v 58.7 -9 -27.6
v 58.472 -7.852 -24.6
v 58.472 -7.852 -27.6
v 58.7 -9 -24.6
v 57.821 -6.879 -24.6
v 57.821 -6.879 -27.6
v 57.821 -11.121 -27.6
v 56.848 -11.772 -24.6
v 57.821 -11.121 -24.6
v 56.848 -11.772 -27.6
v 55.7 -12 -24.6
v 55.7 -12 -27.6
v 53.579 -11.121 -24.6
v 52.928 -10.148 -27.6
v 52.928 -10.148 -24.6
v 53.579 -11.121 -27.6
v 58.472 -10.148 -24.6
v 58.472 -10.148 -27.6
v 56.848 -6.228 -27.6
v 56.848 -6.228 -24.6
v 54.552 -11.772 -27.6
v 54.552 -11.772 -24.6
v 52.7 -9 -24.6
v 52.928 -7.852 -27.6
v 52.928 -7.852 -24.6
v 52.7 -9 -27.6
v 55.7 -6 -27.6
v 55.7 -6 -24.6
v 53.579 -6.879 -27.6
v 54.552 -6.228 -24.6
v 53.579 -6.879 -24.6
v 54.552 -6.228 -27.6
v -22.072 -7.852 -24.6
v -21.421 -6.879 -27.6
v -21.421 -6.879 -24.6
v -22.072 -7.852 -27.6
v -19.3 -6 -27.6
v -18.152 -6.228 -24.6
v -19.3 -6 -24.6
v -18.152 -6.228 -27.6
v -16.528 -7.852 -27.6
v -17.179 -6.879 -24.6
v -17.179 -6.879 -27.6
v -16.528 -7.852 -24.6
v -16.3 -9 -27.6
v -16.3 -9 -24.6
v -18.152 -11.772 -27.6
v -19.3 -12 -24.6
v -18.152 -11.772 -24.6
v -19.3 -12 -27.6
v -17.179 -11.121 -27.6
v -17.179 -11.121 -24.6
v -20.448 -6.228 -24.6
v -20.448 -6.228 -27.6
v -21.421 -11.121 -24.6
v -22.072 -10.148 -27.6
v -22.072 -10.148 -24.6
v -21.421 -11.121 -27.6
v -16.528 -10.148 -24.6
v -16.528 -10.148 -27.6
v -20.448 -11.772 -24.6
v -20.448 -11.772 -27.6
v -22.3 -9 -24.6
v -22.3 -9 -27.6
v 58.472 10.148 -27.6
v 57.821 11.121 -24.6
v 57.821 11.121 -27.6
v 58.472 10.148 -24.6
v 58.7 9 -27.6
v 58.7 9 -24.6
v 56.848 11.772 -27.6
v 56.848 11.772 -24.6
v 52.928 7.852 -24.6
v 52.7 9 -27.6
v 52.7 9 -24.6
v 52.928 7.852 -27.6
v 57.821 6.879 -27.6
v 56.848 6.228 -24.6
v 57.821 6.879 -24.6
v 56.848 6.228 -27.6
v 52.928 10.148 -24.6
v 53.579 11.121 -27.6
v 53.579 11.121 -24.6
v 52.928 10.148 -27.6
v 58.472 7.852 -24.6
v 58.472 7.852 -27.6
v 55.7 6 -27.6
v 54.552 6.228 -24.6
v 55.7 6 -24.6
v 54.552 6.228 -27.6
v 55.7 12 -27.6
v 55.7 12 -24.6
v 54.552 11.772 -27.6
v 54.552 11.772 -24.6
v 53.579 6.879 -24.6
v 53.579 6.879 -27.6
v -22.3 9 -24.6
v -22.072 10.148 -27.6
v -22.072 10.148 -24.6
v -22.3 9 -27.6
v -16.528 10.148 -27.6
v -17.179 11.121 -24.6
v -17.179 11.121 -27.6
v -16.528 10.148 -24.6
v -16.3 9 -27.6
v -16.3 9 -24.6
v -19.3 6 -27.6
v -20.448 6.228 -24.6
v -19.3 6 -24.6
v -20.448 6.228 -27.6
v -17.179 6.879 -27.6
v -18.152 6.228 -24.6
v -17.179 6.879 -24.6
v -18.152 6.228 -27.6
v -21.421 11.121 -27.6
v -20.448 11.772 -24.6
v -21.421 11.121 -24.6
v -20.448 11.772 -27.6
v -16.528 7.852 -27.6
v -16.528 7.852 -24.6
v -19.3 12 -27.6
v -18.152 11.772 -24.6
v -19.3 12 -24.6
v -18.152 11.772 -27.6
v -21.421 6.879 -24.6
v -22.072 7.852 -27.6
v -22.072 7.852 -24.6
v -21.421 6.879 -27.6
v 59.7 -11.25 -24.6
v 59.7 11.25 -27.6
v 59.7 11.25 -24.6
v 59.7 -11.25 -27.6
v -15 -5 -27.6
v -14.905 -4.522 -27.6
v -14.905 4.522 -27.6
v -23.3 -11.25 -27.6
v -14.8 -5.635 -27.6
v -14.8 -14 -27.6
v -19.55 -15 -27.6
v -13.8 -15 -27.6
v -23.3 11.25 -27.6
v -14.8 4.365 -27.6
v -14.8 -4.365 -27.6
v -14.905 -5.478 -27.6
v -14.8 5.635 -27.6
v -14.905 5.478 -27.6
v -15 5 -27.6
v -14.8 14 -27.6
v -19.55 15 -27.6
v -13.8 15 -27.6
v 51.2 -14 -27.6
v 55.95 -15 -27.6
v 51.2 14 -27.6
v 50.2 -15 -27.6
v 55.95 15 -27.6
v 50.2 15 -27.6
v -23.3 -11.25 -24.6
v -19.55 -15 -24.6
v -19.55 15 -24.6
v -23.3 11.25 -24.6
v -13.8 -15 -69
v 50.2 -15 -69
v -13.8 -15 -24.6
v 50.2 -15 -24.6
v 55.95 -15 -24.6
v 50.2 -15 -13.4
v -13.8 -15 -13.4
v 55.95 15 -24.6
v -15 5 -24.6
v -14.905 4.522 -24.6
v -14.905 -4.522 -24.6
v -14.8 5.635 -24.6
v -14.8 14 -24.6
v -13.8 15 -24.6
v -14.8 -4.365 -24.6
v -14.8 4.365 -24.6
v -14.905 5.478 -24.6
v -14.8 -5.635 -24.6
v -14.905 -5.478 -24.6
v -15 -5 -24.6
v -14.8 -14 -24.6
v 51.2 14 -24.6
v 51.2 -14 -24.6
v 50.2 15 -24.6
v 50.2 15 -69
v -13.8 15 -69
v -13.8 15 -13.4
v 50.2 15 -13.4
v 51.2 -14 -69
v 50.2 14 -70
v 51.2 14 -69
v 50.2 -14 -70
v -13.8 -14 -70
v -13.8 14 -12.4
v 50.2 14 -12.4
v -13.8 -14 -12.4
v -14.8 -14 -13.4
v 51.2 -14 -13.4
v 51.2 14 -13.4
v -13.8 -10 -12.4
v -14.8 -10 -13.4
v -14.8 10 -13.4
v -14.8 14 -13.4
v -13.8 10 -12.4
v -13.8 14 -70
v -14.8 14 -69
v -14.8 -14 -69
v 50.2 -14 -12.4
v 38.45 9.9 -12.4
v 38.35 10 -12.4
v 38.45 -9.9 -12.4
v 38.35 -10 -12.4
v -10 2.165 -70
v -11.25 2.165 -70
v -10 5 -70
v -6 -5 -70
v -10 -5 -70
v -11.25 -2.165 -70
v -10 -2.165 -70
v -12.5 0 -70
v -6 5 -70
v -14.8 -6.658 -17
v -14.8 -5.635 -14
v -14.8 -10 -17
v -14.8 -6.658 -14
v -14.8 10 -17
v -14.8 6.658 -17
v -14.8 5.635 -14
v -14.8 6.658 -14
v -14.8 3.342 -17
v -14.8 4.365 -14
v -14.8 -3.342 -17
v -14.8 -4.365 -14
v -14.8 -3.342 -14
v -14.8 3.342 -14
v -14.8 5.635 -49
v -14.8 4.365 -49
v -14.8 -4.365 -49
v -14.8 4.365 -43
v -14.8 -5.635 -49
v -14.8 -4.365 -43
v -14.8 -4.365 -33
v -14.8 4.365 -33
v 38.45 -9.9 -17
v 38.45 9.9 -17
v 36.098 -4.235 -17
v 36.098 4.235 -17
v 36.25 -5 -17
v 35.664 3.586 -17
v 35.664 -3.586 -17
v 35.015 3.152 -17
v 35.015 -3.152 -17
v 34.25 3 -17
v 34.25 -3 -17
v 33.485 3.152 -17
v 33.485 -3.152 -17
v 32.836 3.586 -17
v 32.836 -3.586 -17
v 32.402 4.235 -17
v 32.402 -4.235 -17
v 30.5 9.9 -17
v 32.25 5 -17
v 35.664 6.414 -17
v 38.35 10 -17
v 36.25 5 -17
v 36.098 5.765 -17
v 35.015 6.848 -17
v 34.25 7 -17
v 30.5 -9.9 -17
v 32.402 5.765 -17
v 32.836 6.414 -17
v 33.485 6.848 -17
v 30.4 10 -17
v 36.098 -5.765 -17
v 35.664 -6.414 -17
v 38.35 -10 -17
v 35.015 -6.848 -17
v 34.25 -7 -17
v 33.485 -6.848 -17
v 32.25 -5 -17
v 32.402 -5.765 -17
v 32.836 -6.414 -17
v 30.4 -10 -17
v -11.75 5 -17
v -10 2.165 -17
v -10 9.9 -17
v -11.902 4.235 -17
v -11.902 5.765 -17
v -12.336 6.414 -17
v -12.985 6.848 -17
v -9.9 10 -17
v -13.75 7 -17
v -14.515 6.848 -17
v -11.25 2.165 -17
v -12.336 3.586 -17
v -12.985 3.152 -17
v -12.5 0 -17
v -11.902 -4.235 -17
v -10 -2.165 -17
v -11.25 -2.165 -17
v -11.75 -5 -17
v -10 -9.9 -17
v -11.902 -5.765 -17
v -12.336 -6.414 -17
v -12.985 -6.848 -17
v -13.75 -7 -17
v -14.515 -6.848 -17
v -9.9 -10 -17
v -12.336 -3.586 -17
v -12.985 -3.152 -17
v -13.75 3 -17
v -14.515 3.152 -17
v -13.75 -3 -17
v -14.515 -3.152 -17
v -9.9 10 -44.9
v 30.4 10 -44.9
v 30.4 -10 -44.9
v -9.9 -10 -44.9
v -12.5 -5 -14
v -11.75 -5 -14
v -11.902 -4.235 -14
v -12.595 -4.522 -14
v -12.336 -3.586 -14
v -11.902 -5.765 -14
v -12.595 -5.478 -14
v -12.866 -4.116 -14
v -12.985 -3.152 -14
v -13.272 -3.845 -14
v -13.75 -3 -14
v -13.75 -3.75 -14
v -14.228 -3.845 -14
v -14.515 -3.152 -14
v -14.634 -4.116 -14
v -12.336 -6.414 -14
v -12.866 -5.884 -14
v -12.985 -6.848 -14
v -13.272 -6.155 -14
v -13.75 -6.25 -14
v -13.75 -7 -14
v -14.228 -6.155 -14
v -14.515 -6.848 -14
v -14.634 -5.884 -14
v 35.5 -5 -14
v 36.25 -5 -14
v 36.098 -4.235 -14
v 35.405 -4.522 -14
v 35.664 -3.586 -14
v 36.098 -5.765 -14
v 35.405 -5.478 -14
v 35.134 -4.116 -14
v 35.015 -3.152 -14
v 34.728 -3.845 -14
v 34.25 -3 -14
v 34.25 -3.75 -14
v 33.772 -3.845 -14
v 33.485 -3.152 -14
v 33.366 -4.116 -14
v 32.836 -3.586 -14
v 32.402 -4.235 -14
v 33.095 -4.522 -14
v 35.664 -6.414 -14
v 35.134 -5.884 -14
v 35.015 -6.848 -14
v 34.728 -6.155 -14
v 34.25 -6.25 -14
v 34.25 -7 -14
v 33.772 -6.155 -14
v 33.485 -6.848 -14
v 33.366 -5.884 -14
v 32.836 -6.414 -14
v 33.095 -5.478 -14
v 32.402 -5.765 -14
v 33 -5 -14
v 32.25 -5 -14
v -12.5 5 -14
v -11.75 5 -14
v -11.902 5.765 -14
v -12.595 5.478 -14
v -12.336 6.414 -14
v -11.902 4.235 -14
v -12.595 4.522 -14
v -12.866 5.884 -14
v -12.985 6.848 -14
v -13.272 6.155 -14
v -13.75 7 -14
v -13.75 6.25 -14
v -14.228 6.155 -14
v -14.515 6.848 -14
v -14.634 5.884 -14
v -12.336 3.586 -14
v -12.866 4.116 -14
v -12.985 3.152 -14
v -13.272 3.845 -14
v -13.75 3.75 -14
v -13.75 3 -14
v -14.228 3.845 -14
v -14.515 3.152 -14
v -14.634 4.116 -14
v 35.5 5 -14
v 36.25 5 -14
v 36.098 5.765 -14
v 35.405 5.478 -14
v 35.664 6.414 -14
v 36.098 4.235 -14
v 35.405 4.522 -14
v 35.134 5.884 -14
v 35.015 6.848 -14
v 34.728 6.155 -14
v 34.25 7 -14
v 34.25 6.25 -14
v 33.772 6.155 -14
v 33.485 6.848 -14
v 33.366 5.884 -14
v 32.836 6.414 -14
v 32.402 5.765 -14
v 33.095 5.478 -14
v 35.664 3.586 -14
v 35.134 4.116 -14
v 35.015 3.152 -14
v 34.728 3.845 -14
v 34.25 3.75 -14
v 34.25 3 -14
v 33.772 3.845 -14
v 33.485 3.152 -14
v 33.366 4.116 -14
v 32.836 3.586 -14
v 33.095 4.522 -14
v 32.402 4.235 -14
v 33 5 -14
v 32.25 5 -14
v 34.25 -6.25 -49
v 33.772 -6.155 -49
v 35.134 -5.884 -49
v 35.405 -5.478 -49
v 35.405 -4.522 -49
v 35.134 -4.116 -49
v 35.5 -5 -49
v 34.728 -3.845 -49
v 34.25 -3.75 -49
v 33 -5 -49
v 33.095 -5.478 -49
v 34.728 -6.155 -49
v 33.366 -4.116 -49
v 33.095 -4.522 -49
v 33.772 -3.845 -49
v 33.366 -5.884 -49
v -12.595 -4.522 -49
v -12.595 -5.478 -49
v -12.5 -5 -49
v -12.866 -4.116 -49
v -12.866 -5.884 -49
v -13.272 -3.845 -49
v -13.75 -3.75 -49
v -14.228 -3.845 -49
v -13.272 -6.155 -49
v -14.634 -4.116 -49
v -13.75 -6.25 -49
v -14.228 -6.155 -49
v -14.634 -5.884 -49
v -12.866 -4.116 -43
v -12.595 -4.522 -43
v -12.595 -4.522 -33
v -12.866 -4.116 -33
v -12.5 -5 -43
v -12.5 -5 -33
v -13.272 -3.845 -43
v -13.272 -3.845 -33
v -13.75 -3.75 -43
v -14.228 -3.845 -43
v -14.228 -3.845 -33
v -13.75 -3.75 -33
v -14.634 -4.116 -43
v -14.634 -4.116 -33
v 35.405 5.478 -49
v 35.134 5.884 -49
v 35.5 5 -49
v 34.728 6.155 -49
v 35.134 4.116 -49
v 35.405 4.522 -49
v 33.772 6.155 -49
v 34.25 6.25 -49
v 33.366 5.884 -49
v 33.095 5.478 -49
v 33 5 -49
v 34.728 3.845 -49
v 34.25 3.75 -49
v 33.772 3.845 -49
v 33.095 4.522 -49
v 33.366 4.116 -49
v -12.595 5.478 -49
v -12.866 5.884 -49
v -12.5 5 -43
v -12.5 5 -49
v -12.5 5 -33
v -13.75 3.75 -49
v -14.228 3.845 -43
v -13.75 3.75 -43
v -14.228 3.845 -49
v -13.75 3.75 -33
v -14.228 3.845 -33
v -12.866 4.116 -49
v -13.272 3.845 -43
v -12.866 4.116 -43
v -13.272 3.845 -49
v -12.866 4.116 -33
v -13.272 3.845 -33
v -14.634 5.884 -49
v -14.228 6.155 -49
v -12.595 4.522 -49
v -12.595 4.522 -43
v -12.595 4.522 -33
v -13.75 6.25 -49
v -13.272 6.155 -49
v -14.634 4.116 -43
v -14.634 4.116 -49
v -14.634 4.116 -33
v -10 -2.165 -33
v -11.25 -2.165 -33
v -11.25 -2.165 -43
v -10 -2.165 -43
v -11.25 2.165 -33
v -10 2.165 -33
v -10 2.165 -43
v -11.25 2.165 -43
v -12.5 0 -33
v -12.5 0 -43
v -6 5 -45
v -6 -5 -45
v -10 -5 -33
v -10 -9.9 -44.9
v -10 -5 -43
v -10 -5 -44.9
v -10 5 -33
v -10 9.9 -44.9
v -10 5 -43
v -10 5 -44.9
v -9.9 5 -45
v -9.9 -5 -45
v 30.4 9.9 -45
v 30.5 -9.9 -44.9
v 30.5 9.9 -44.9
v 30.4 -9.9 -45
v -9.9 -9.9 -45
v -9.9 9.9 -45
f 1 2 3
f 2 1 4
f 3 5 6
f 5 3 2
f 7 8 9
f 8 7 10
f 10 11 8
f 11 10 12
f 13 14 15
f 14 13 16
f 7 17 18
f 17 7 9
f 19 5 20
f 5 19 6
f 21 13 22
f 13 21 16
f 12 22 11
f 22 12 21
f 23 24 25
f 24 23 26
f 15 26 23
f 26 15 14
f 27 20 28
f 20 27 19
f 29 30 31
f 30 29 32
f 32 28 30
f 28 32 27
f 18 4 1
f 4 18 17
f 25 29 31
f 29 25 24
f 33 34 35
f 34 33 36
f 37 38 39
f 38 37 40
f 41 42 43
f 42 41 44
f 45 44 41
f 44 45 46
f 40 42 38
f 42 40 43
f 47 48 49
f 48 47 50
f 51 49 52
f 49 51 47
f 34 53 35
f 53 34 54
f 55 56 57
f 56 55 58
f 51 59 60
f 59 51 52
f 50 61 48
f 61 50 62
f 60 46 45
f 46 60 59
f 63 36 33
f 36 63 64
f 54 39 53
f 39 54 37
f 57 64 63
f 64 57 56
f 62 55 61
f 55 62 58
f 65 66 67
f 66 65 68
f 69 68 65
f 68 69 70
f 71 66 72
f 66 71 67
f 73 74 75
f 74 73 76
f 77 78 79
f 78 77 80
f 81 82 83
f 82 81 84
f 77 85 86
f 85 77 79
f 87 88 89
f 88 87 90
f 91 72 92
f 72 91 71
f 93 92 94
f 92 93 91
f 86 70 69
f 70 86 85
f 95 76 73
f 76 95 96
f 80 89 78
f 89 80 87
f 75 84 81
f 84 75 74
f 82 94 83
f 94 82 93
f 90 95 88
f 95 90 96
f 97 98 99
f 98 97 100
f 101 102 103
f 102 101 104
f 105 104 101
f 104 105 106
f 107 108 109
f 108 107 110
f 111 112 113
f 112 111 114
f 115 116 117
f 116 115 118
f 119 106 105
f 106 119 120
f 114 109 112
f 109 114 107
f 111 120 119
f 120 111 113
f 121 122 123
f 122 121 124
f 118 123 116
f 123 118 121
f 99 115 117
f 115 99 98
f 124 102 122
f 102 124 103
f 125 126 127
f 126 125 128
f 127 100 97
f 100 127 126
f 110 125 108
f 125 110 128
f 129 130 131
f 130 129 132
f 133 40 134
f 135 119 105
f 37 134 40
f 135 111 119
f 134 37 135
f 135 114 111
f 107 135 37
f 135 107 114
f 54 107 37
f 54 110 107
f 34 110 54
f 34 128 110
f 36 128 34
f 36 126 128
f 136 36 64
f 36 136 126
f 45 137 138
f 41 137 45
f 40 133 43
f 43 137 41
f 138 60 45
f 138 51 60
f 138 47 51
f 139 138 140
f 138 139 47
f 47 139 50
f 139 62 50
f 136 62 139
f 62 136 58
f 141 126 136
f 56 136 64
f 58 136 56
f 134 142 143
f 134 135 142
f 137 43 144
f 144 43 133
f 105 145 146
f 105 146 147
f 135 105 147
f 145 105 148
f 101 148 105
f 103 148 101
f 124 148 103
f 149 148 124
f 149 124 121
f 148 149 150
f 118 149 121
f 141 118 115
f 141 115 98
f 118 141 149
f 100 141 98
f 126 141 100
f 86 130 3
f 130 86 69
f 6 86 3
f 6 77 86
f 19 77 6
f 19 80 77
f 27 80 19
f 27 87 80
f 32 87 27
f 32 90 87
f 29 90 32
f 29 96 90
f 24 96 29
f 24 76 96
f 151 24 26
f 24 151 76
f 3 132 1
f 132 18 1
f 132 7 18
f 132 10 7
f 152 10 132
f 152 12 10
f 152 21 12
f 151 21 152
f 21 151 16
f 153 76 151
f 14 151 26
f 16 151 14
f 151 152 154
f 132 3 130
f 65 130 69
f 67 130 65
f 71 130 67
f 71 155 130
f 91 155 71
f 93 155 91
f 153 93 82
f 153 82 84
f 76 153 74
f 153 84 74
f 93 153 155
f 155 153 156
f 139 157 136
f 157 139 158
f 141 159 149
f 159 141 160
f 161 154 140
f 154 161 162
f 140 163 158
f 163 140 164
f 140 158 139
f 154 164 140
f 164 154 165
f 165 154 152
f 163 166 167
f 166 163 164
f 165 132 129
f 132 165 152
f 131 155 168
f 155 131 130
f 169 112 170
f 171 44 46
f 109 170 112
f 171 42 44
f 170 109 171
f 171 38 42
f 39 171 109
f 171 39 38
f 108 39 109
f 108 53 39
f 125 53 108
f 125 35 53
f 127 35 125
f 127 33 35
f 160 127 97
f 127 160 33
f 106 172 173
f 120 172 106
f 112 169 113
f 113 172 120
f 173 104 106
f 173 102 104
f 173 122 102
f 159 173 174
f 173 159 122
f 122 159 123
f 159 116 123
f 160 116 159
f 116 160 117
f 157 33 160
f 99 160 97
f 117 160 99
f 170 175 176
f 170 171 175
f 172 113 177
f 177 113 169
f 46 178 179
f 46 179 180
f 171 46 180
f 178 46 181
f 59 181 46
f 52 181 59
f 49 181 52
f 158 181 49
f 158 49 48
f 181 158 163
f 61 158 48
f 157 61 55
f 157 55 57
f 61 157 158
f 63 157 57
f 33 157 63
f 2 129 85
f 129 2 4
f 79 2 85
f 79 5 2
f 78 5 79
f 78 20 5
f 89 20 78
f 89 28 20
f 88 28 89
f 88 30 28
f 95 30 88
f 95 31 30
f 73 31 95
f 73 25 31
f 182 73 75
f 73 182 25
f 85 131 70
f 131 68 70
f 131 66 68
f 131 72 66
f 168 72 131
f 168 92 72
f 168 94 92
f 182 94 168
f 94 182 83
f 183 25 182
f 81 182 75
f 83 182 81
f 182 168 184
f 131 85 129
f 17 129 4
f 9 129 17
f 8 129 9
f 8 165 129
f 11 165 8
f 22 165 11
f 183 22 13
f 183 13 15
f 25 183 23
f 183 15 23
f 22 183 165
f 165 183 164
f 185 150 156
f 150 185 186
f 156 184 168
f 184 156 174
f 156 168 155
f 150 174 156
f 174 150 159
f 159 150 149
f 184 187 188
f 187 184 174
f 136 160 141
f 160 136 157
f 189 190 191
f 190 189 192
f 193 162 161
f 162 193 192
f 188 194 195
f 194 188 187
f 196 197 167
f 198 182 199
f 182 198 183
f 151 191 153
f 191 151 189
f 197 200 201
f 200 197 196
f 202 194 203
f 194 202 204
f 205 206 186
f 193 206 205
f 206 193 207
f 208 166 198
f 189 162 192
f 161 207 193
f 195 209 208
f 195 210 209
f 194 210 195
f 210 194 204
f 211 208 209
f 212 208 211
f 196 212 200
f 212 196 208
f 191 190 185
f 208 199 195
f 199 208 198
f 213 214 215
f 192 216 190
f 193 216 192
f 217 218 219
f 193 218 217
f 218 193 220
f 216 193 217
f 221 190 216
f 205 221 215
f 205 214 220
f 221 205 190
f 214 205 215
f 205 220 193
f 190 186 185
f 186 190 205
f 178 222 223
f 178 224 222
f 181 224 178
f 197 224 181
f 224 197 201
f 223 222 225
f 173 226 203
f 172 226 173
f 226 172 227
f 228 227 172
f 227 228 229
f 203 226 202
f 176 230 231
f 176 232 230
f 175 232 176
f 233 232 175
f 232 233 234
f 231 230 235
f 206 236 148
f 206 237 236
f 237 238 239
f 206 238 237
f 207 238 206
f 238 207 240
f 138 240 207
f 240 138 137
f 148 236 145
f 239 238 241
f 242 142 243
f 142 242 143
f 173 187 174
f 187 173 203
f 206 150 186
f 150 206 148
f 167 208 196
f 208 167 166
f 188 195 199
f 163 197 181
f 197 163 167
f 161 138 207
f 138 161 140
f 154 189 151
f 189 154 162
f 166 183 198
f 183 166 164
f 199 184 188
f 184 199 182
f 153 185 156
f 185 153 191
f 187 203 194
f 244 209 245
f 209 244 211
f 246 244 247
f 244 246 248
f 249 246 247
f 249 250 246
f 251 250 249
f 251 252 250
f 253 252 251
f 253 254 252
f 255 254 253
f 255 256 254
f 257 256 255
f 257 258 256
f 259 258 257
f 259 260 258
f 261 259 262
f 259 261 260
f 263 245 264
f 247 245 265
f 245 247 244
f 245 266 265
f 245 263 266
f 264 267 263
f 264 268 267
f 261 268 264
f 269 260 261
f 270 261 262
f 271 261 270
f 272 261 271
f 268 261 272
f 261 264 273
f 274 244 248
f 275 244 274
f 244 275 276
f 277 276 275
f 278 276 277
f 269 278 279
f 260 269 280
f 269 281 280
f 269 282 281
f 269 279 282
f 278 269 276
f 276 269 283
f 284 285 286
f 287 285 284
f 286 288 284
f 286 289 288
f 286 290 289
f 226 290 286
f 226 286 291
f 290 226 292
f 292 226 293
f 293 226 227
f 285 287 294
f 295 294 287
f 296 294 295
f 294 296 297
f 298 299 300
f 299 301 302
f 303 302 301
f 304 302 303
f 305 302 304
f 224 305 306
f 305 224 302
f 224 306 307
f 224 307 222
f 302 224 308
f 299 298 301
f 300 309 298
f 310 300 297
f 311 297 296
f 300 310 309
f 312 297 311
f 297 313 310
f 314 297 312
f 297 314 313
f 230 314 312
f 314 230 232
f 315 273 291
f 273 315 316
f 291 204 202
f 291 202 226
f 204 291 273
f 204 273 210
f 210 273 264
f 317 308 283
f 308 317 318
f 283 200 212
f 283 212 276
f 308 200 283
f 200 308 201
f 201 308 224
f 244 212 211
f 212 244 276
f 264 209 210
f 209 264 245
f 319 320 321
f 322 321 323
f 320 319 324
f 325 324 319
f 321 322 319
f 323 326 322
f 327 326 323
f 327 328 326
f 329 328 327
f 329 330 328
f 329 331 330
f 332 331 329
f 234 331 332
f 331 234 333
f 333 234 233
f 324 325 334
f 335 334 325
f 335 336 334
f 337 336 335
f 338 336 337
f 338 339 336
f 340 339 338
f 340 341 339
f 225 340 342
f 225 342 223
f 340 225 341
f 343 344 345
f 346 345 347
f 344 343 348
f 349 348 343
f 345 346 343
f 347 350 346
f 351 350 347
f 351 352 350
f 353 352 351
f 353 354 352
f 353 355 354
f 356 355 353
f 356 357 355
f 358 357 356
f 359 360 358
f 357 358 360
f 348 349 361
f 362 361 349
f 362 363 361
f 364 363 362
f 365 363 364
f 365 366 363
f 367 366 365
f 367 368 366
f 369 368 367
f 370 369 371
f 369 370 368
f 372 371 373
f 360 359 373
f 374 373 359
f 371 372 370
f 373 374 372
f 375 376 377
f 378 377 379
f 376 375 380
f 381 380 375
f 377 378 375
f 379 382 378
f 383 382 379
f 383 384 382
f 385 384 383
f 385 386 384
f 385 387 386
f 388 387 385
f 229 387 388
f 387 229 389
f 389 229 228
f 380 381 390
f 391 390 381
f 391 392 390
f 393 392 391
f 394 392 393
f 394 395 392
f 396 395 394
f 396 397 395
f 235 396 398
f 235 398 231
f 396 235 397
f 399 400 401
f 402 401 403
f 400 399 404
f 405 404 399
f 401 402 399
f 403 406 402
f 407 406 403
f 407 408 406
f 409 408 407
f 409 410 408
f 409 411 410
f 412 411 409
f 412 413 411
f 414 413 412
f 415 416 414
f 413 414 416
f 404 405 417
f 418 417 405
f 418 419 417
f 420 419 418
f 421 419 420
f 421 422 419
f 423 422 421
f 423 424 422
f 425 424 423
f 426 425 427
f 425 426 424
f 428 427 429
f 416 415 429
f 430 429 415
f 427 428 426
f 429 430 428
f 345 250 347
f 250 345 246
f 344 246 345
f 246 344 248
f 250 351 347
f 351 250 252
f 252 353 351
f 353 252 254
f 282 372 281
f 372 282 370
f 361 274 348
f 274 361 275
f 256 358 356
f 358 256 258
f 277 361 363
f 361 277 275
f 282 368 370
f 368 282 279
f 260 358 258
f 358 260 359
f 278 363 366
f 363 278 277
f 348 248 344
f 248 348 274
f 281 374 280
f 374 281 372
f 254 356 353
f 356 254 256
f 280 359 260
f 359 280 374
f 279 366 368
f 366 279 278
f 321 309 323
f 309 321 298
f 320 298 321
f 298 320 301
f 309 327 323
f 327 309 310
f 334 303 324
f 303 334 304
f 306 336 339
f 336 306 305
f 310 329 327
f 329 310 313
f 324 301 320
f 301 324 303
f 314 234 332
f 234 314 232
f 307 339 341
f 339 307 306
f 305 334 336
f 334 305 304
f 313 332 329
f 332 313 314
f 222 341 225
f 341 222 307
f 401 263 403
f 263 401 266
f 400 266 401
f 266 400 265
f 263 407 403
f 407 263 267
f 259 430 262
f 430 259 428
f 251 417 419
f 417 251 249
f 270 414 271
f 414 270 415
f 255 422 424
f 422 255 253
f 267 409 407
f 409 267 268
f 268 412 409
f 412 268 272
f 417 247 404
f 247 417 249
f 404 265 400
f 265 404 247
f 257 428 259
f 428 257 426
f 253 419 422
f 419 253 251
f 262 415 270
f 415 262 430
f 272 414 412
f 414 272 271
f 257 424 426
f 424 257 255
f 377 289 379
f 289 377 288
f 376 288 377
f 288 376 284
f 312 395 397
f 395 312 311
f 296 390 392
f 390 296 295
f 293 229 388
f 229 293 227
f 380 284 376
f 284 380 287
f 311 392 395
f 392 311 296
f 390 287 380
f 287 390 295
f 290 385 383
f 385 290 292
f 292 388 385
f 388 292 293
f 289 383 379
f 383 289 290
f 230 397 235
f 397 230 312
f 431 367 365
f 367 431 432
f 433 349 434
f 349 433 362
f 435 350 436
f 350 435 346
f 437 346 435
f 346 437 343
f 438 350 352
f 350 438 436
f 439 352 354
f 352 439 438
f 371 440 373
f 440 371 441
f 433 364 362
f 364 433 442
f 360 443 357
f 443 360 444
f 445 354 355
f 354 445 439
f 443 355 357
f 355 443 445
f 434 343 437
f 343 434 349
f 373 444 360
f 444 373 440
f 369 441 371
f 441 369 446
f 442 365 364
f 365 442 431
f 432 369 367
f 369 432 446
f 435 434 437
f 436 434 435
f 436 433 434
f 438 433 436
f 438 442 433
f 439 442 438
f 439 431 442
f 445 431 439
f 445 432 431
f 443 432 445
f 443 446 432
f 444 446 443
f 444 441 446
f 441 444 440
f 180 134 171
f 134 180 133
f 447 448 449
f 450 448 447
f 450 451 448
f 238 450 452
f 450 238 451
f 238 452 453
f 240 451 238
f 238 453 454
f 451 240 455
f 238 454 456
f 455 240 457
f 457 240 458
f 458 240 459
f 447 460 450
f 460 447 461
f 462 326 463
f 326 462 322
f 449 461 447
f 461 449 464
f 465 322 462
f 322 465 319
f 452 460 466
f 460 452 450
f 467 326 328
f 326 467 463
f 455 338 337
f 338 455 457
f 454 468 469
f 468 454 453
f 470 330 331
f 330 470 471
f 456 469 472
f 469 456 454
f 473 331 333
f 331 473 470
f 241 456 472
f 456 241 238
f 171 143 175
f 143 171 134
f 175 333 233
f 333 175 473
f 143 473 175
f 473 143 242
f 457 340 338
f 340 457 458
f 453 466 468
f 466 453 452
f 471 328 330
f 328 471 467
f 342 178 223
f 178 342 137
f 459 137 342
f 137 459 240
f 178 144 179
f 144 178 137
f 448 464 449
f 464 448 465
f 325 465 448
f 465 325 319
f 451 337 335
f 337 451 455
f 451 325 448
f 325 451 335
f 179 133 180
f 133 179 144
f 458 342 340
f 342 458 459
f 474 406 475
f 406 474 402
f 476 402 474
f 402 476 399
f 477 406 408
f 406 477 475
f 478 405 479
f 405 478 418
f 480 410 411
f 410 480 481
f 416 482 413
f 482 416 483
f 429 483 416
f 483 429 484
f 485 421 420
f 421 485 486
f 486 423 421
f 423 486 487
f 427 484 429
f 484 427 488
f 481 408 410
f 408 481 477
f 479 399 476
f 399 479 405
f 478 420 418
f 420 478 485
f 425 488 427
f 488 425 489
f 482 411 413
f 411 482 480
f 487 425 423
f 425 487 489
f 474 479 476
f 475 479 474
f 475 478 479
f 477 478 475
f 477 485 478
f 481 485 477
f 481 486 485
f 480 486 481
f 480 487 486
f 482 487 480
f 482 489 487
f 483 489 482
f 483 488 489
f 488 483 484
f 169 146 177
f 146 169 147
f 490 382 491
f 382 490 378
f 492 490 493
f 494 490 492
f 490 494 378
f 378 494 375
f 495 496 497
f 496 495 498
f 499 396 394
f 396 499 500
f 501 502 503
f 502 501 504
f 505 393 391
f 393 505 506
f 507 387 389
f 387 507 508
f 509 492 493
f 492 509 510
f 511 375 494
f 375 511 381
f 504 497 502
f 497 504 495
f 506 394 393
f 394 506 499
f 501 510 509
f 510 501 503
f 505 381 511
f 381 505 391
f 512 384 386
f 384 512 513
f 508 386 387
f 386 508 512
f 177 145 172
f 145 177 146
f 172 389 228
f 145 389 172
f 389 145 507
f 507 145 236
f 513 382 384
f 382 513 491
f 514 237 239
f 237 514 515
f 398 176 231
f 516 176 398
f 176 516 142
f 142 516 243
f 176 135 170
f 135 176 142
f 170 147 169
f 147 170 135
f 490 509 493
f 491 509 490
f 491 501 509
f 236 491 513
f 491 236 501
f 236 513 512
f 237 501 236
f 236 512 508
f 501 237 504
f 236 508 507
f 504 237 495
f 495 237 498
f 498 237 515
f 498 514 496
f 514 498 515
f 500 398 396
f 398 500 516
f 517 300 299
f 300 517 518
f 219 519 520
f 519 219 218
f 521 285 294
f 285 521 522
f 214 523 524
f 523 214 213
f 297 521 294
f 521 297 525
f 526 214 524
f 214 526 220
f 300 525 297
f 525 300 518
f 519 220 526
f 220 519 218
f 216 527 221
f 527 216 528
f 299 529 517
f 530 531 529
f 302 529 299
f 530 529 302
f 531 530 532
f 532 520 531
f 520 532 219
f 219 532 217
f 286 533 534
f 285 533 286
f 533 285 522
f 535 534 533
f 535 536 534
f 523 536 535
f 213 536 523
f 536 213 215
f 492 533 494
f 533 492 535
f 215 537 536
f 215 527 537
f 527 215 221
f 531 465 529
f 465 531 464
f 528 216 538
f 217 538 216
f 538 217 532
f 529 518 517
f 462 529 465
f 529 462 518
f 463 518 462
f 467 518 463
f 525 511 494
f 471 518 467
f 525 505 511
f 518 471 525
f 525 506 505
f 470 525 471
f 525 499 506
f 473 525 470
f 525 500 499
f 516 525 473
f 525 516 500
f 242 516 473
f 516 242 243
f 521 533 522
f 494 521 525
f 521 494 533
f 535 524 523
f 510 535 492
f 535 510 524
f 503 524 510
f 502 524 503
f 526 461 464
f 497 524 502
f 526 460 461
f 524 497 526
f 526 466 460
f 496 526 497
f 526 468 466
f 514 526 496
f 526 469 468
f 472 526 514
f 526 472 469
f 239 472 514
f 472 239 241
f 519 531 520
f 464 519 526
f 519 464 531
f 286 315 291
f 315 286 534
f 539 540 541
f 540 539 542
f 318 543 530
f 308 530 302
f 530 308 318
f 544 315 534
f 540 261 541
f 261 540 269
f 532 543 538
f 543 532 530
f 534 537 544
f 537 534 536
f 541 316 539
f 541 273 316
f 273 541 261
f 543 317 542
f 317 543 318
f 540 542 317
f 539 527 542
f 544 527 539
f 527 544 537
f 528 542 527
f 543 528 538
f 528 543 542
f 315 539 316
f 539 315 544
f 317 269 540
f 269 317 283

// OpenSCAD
/*

This script will create servo adapters and servo dummies.

** This script is work in progress. It has not been tested yet IRL, and the servo database is minimal, but will grow. **
 
Let's say you are printing a 3D model that was build with a very specific servo in mind, but that servo is no longer available. You can use this script to generate a 3D model that will make a smaller servo fit into the position of the original servo.
 
Also, if you decide to scale a 3D model (let's say you want to print the InMoov robot (www.inmoov.fr), but it's too tall and you scale it to 80%), the servo adapter script will generate adapters that make smaller servos fit your scaled model perfectly.
 
If you set "Small Servo" to "None", the script will generate a dummy servo case that will fit into the original servo mount.

The newest version of this script is available on GitHub: https://github.com/MatthiasWM/ServoAdapterSCAD , merge request welcome.

Still to come:
* generic servo sizes
* more entries in the database
* customize: fatten mounting tabs
* customize: choose mounting bolts in more detail, maybe captive nut)

 random links:
	https://servodatabase.com/
	https://www.pololu.com/blog/12/introduction-to-servos 
	https://a.pololu-files.com/picture/0J1829.677.png 
	http://www.theampeer.org/midwest/photos/servo-sizes.jpg 
	https://www.wiltronics.com.au/product/10364/rc-servo-metal-gears-8-8kg-cm-towerpro-mg995/ 
	https://www.t2shop.de/SRT-BH9027-Fullsize-Digital-Servo-Brushless-HV-HIGH-TORQUE-0075sek-/-20kg
	https://www.hoelleinshop.com/Sender-Servos-etc-/Servos/Servo-Savox-SC-1258TG-Digital-12-0kg-cm-Heli-Version.htm?shop=hoellein
  https://www.sparkfun.com/servos

*/
 
// ---- customizable settings ---------------------------------------------

// create a servo adapter of this type
Large_Servo = 1; // [0:None, 1:HS5805MG, 2:DS3218]

// create space for this servo ("None" for dummy)
Small_Servo = 2; // [0:None, 1:HS5805MG, 2:DS3218]

Mount_Small_Servo = 0; // [0:from the top, 1:from the bottom, 2:clam shell]

// draw only the part that is needed to function as an adapter
Draw_Adapter = 0; // [0:full servo, 1: top half, 2: small servo height, 3:minimal, 4:minimal plus]

// useful in clam shell mode
Draw_Sides = 0; // [0:both sides, 1:left side, 2:right side]

// 'auto' draws only if no small servo is chosen
Draw_Servo_Wheel = 0; // [0:auto, 1:no, 2:yes, 3:clipped]

/* [Large Servo Settings] */

// Fit adapter into scaled models (%)
Large_Servo_Scale = 100.0;

// adjust servo size to 3d printer imprecisions 
Large_Servo_Adjust = 0.0; // [-2.0:0.05:2.0]

// create a channel to route the cable away from the adapter
Large_Servo_Cable_Channel = 0; // [0:no, 1:yes]

/* [Small Servo Settings] */

// adjust servo size to 3d printer imprecisions 
Small_Servo_Adjust = 0.0; // [-2.0:0.05:2.0]

// create a channel to route the cable through the adapter
Small_Servo_Cable_Channel = 1; // [0:no, 1:yes]

// diameter of screw or bolt holding the small servo (mm, 0 for none)
Fastener_Diameter = 2.5;

// length of screw or bolt (mm)
Fastener_Length = 35.0;

// ---- end of customizable settings --------------------------------------

/* [Hidden] */

/* Servo Database:
	The database is an array of datasets of a servo name 
	and a servo case reference.
	*/

/* Servos Datasets:
	Servos are stored as a dataset linking to a case design,
	a mount design, and a wheel design.
	For values or references that are undefined, a reasonable
	value is calculated.
	
	Length is along the x axis, width is along y, height is along z
	*/

/* Servo Case:
	Servo cases are stored using an integer identifying the
	type of case (1=body, mount, wheel), followed by values 
	describing the case, for example 
	[1, body_data, body_offset, mount_data, mount_offset, wheel_data]

/* Servo Body:
	Servo bodies are stored using an integer identifying the
	type of body (1=rectangular), followed by values describing
	the body, for example [1, [length, width, height], [axle_offset_x, y, z]]
	*/
	
/* Servo Mount:
	Servo mounts are stored using an integer identifier
	(1=rectangular, four holes, 2=two holes), followed by values
	describing the mount, for example
	[1, [length, width, height], hole_dist_x, hole_dist_y, hole_dia]
	[2, [length, width, height], hole_dist_x, hole_dia]
	*/
	
/* Servo Wheel:
	Servo wheels are stored using an integer identifier
	(1=round wheel), followed by values describing the wheel, 
	for example [1, diameter, height]
	*/

// ---- servo class list --------------------------------------------------
kClassStandard = 5;
kClassLarge = 5;

// ---- wheel database ----------------------------------------------------
// wheel type 0, no wheel: [0]
wheel_none = [ 0 ];
//	wheel type 1, disk: [1, diameter, height]
//		diameter of disk in mm
//		height of disk in mm
wheel_standard = [ 1, 24.0, 3.0 ];
wheel_large = [ 1, 36.0, 4.0 ];

// default sizes of wheels for every servo class
wheel_db = [ undef, undef, undef, undef, wheel_standard, wheel_large ];

// ---- mount database ----------------------------------------------------
//	mount type 1, two tabs, 4 holes: [1, [length, width, height], hole_dist_x, hole_dist_y, hole_dia]
//		length, width, and heigt of mounting surface in mm
//		hole_dist_x, hole_dist_y: distance of hole to each other in mm
//		hole_dia: diameter of mounting hole in mm
mount_480_100 = [ 1, [56.4, 20.0, 3.0], 48.0, 10.0, 4.0 ];
mount_750_180 = [ 1, [83.0, 30.0, 3.0], 75.0, 18.0, 6.0 ];

// ---- body database -----------------------------------------------------
//	body type 1, chamfered box: [1, [length, width, height]]
//		length, width, and heigt of body without mounts or wheel in mm
body_405_200_410 = [ 1, [ 40.5, 20.0, 41.0]  ];
body_660_300_676 = [ 1, [ 66.0, 30.0, 57.6]  ];

// ---- servo database ----------------------------------------------------
//	servo type 1, body, mount wheel: [1, class, body, [body_offset_vec], mount, mount_offset, wheel]
//		class: one of the kClass* constants that best matches the body
//		body: reference to an entry in the body database
//		body_offset: vector with 3 elements, x is the offset from the left side of the body to the center of the wheel (usually half the case width)
//		             y is the offset of the center of the body to the center of the wheel, usually 0
//		             z is the offset from the top of the wheel to the bottom of the body
//		mount: reference to an entry in the mount database
//		mount_offset: the distance from the top of the wheel to the bottom of the mounting tabs
//		wheel: reference to an entry in the wheel database
servo_hitec_hs5805mg = [ 1, kClassStandard, body_660_300_676, [14.8, 0.0, 70.0], mount_750_180, 27.6, wheel_large ];
servo_ds_ds3218 = [ 1, kClassLarge, body_405_200_410, [10.0, 0.0, 45.0], mount_480_100, 17.0, wheel_standard ];

// ---- servo lookup table ------------------------------------------------
servo_db = [
  [ "none" ],
	[ "Hitec HS-5805MG", servo_hitec_hs5805mg ],
	[ "DigitalServo DS3218", servo_ds_ds3218 ],
];

/*
https://servodatabase.com/servos/all

  Nano        w< 7.5, L<18.5
	Sub-Micro   w<11.5, L<24
	Micro       w<13,   L<29
	Mini        w<17,   L<32.5
	Standard    W<20,   L<38
	Large       W>20    L>38
*/

// --- draw routines have an optional style parameter
kStyleDraw 	= 0;	// draw an object, so it fits into existing spaces (when in doubt, draw less)
kStyleCut 	= 1;	// draw a space, so an object fits into it (when in doubt, draw more)
kStyleMount = 2;	// draw parts that may be needed to mount the smaller servo, but may not be part of the bigger servo

d1 = 0.0001; // small distance to make booleans work better
d2 = 2*d1;

module cbox(size, chamfer)
{
	c = chamfer;
	dx = size[0]/2;
	dy = size[1]/2;
	dz = size[2]/2;
	
	polyhedron(
		points = [
			[-dx+c, -dy, -dz+c], // 0: front bottom left
			[-dx, -dy+c, -dz+c],
			[-dx+c, -dy+c, -dz],
			[-dx+c, dy, -dz+c], // 3: back bottom left
			[-dx, dy-c, -dz+c],
			[-dx+c, dy-c, -dz],
			[dx-c, dy, -dz+c], // 6: back bottom right
			[dx, dy-c, -dz+c],
			[dx-c, dy-c, -dz],
			[dx-c, -dy, -dz+c], // 9: front bottom right
			[dx, -dy+c, -dz+c],
			[dx-c, -dy+c, -dz],
			[-dx+c, -dy, dz-c], // 12: front top left
			[-dx, -dy+c, dz-c],
			[-dx+c, -dy+c, dz],
			[-dx+c, dy, dz-c], // 15: back top left
			[-dx, dy-c, dz-c],
			[-dx+c, dy-c, dz],
			[dx-c, dy, dz-c], // 18: back top right
			[dx, dy-c, dz-c],
			[dx-c, dy-c, dz],
			[dx-c, -dy, dz-c], // 21: front top right
			[dx, -dy+c, dz-c],
			[dx-c, -dy+c, dz],
		],
		faces = [
			// front
			[0, 12, 21, 9], // front
			[0, 2, 1], // front bottom left
			[0, 1, 13, 12], // front left
			[12, 13, 14], // front top left
			[12, 14, 23, 21], // front top
			[21, 23, 22], // front top right
			[9, 21, 22, 10], // front right
			[9, 10, 11], // front bottom right
			[0, 9, 11, 2], // front bottom
			// back
			[3, 6, 18, 15], // back
			[3, 4, 5], // back bottom left
			[3, 15, 16, 4], // back left
			[15, 17, 16], // back top left
			[15, 18, 20, 17], // back top
			[18, 19, 20], // back top right
			[6, 7, 19, 18], // back right
			[6, 8, 7], // back bottom right
			[3, 5, 8, 6], // back bottom
			// outer ring
			[1, 4, 16, 13], // left
			[13, 16, 17, 14], // left top
			[14, 17, 20, 23], // top
			[19, 22, 23, 20], // top right
			[7, 10, 22, 19], // right
			[7, 8, 11, 10], // bottom right
			[2, 11, 8, 5], // bottom
			[1, 2, 5, 4], // bottom left
		]
	);	
}

module fbox(size, chamfer)
{
	c = chamfer;
	dx = size[0]/2;
	dy = size[1]/2;
	dz = size[2]/2;
	
	polyhedron(
		points = [
			[-dx+c, -dy, -dz], // 0: front left
			[-dx, -dy+c, -dz],
			[-dx+c, -dy, dz],
			[-dx, -dy+c, dz],
			[-dx+c, dy, -dz], // 4: back left
			[-dx, dy-c, -dz],
			[-dx+c, dy, dz],
			[-dx, dy-c, dz],
			[dx-c, dy, -dz], // 8: back right
			[dx, dy-c, -dz],
			[dx-c, dy, dz],
			[dx, dy-c, dz],
			[dx-c, -dy, -dz], // 12: front right
			[dx, -dy+c, -dz],
			[dx-c, -dy, dz],
			[dx, -dy+c, dz],
		],
		faces = [
			[2, 3, 7, 6, 10, 11, 15, 14], // top
			[1, 5, 7, 3], // left
			[4, 6, 7, 5], // left back
			[4, 8, 10, 6], // back
			[8, 9, 11, 10], // back right
			[9, 13, 15, 11], // right
			[12, 14, 15, 13], // front right
			[0, 2, 14, 12], // front
			[0, 1, 3, 2], // front left
			[0, 12, 13, 9, 8, 4, 5, 1], // bottom
		]
	);	
}




module draw_wheel_for_servo_type_1(servo, style=kStyleDraw)
{
	wheel = servo[6];
	type = wheel[0];
	if (type==undef || type==0) { // wheel: none
	} else if (type==1) { // wheel: disk
		diameter = wheel[1];
		height = wheel[2];
		axle_diameter = diameter/2;
		axle_height = diameter/2;
		// draw the assembly
		union() {
			difference() {
				// draw the wheel
				translate([0.0, 0.0, -height])
					cylinder(d=diameter, h=height);
				// draw holes into the wheel
				translate([0.0, 0.0, -height-d1]) union() {
					for (r=[diameter/12*5, diameter/12*4, diameter/12*3]) {
						translate([ r, 0.0, 0.0]) cylinder(r=1, h=height+d2);
						translate([-r, 0.0, 0.0]) cylinder(r=1, h=height+d2);
						translate([0.0,  r, 0.0]) cylinder(r=1, h=height+d2);
						translate([0.0, -r, 0.0]) cylinder(r=1, h=height+d2);
					}
				}
				// draw a cone into the center of the wheel
				translate([0.0, 0.0, -height+d1])
					cylinder(r1=0, r2=diameter/8, h=height);
			}
			// draw the axle
			translate([0.0, 0.0, -axle_height])
				cylinder(d=axle_diameter, h=axle_height-height+d1);
		}
	} else {
		echo("Unknown servo wheel type: ", type);
	}
}


module clip_wheel_for_servo_type_1(servo, style=kStyleDraw)
{
	body = servo[2];
	offset = servo[3];
	type = body[0];
	size = body[1];
	if (type==1) { // body: chamfered box
//		translate([size[0]/2-offset[0], offset[1], size[2]/2-offset[2]])
//			cbox(body[1], 1.0);
		intersection() {
			translate([0, offset[1], 0])
				cube([1000, size[1], 1000], center=true);
			draw_wheel_for_servo_type_1(servo, style);
		}
	}
}


module draw_body_for_servo_type_1(servo, style=kStyleDraw)
{
	body = servo[2];
	offset = servo[3];
	mount_offset = servo[5];
	type = body[0];
	
	// adjust body size for 3d printer imprecissions
	adj = (style==kStyleDraw) ? Large_Servo_Adjust : Small_Servo_Adjust;
	os = body[1];
	echo(os);
	size = [os[0]+2*adj, os[1]+2*adj, os[2]+2*adj];
	echo(adj, size);

	cbox_chamfer = style==kStyleDraw ? 1.0 : 0.1;
	if (type==1) { // body: chamfered box
		difference() {
			translate([size[0]/2-offset[0], offset[1], size[2]/2-offset[2]])
				cbox(size, cbox_chamfer);
			if (style==kStyleDraw && Large_Servo_Cable_Channel==1) {
				// half pipe going down the left side fitting the R/C cable
				translate([-offset[0], offset[1], -100-mount_offset])
				//translate([-offset[0], offset[1], -mount_offset-100])
					cylinder(h=200, r=2.5, $fn=6, center=true);
			}
		}
	} else {
		echo("Unknown servo body type: ", type);
	}
}


module draw_mount_for_servo_type_1(servo, style=kStyleDraw)
{
	body = servo[2];
	size = body[1];
	offset = servo[3];
	
	// adjust mount size for 3d printer imprecissions
	adj = (style==kStyleDraw) ? Large_Servo_Adjust : Small_Servo_Adjust;
	om = servo[4];
	mount = [om[0], [om[1][0]+2*adj, om[1][1]+2*adj, om[1][2]], om[2], om[3], om[4]];
	
	mount_offset = servo[5];
	type = mount[0];
	fbox_chamfer = style==kStyleDraw ? size[1]/8 : 0.1;
	if (type==1) { // mount: 2 tabs with two holes each
		// 	[1, [length, width, height], hole_dist_x, hole_dist_y, hole_dia]
		mount_size 	= mount[1];
		hole_dist_x = mount[2]/2;
		hole_dist_y = mount[3]/2;
		hole_dia 		= mount[4];
		// draw the entire mount
		difference() {
			// draw the tabs
			union() {
				translate([size[0]/2-offset[0], offset[1], mount_size[2]/2-mount_offset])
					fbox(mount_size, fbox_chamfer);
				// in 'cut' style, draw space for reinforcement triangle
				if (style==kStyleCut) 
					translate([size[0]/2-offset[0], offset[1], mount_size[2]/2-mount_offset+mount_size[1]/8])
						cube([mount_size[0], mount_size[2], mount_size[1]/4], center=true);				
			}
			// subtract the mounting holes
			// don't draw holes on the small servo if we use clam shell mounting, so we can slide the servo in from the side
			if (style==kStyleDraw || Mount_Small_Servo!=2) {
				// TODO: subtract holes for mounting screws on the small servo
				translate([size[0]/2-offset[0], offset[1], -mount_offset-d1]) {
					hm = mount_size[2]+d2;
					translate([ hole_dist_x,  hole_dist_y, 0.0]) cylinder($fn=16, h=hm, d=hole_dia);
					translate([-hole_dist_x,  hole_dist_y, 0.0]) cylinder($fn=16, h=hm, d=hole_dia);
					if (hole_dist_y>0) {
						translate([ hole_dist_x, -hole_dist_y, 0.0]) cylinder($fn=16, h=hm, d=hole_dia);
						translate([-hole_dist_x, -hole_dist_y, 0.0]) cylinder($fn=16, h=hm, d=hole_dia);
					}
				} 
			}
		}
		// make room for the servo to slide in from the top or bottom
		if (style==kStyleCut) {
			// ---- create space so that the servo can be inserted from above or below
			if (Mount_Small_Servo==0) { // mount from the top (the most common way
				// extend the mount all the way to the top, so we can slide the servo in
				translate([size[0]/2-offset[0], offset[1], mount_size[2]-mount_offset/2])
					fbox([mount_size[0], mount_size[1], mount_offset], fbox_chamfer);
				// create holes for the fasteners
				if (Fastener_Diameter>0) {
					hf = Fastener_Length;
					df = Fastener_Diameter;
					translate([size[0]/2-offset[0], offset[1], -mount_offset+mount[1][2]+d1-hf]) {
						translate([ hole_dist_x,  hole_dist_y, 0.0]) cylinder($fn=16, h=hf, d=df);
						translate([-hole_dist_x,  hole_dist_y, 0.0]) cylinder($fn=16, h=hf, d=df);
						if (hole_dist_y>0) {
							translate([ hole_dist_x, -hole_dist_y, 0.0]) cylinder($fn=16, h=hf, d=df);
							translate([-hole_dist_x, -hole_dist_y, 0.0]) cylinder($fn=16, h=hf, d=df);
						}
					}
				}				
			} else if (Mount_Small_Servo==1) { // mount from the bottom
				// extend the mount all the way to the bottom, so we can slide the servo in
				translate([size[0]/2-offset[0], offset[1], -mount_offset-100])
					fbox([mount_size[0], mount_size[1], 200], fbox_chamfer);
				if (Fastener_Diameter>0) {
					hf = Fastener_Length;
					df = Fastener_Diameter;
					translate([size[0]/2-offset[0], offset[1], -mount_offset-d1]) {
						translate([ hole_dist_x,  hole_dist_y, 0.0]) cylinder($fn=16, h=hf, d=df);
						translate([-hole_dist_x,  hole_dist_y, 0.0]) cylinder($fn=16, h=hf, d=df);
						if (hole_dist_y>0) {
							translate([ hole_dist_x, -hole_dist_y, 0.0]) cylinder($fn=16, h=hf, d=df);
							translate([-hole_dist_x, -hole_dist_y, 0.0]) cylinder($fn=16, h=hf, d=df);
						}
					}
				}
			}
			// ---- cable channel (TODO: shouldn't this be in the 'body' module?
			if (Small_Servo_Cable_Channel==1) {
				// half pipe going down the left side fitting the R/C cable
				translate([-offset[0], offset[1], -mount_offset-100])
					cylinder(h=200, r=2.5, $fn=6, center=true);
				// square pipe going down the side fitting the R/C plug
				translate([-offset[0]+2, offset[1], -mount_offset-100])
					cube([4, 10, 200], center=true);
				// square pipe going out the left side fitting the R/C plug
				translate([-offset[0]-50, offset[1], -offset[2]+7])
					cube([100, 10, 10], center=true);
			}
		}
	} else {
		echo("Unknown servo mount type: ", type);
	}
}


module draw_servo(servo, style=kStyleDraw)
{
	type = servo[0];
	if (type==1) { // ---- R/C servo: case, mount, wheel
		
		// read elements in or possibly incomplete database entry
		class 				= servo[1];
		body 					= servo[2];
		body_offset 	= servo[3];
		mount 				= servo[4];
		mount_offset	= servo[5];
		wheel 				= (servo[6]==undef) ? wheel_db[class] : servo[6];
		
		// create a new servo definition based on the entries we found or added
		new_servo = [1, class, body, body_offset, mount, mount_offset, wheel];
		
		// now draw all parts of our servo
		draw_body_for_servo_type_1(new_servo, style);
		draw_mount_for_servo_type_1(new_servo, style);
		
		if (Draw_Servo_Wheel==0) {
			if (Small_Servo==0) {
				draw_wheel_for_servo_type_1(new_servo, style);
			}
		}
		if (Draw_Servo_Wheel==1) {
			// don't draw it
		} else if (Draw_Servo_Wheel==2) {
			// draw the entire wheel
			draw_wheel_for_servo_type_1(new_servo, style); 
		} else if (Draw_Servo_Wheel==3) {
			// clip the wheel to the body in Y, so it can 3D-print more easily
			clip_wheel_for_servo_type_1(new_servo, style); 
		}
		
	} else {
		
		echo("Unknown servo case type: ", type);
		
	}
}


module draw_scene()
{
	if (Large_Servo!=0 && Small_Servo==0) {
		scale(Large_Servo_Scale/100.0)
			draw_servo(servo_db[Large_Servo][1], style=kStyleDraw);
	} else if (Large_Servo!=0 && Small_Servo!=0) {
		difference() {
			scale(Large_Servo_Scale/100.0)
				draw_servo(servo_db[Large_Servo][1], style=kStyleDraw);
			draw_servo(servo_db[Small_Servo][1], style=kStyleCut);
		}
	} else if (Large_Servo==0 && Small_Servo!=0) {
		color("Salmon")
			draw_servo(servo_db[Small_Servo][1], style=kStyleCut);
	} else if (Large_Servo==0 && Small_Servo==0) {
		rotate([90, 0, 0]) text("empty");
	}
}


/**
 * Draw a shape that is subtracted from the entire scene.
 *
 * Y-Clipping allows for printing the adapter in halves and using them
 * as a clam shell to hold the smaller servo in place.
 * 
 * Draw_Sides = 0; // [0:both sides, 1:left side, 2:right side]
 */
module clip_y() 
{
	// clip both sides, the left side, or the right side
	if (Draw_Sides==1) {
			translate([0, -100, -98])
				cube(200, center=true);
	} else if (Draw_Sides==2) {
			translate([0, 100, -98])
				cube(200, center=true);
	}
}


/**
 * Draw a shape that is subtracted from the entire scene.
 *
 * Z-Clipping reduces the model to the minimal shape that is needed
 * for a servo adapter.
 *
 * Draw_Adapter = 0; // [0:full servo, 1: top half, 2: small servo height, 3:minimal, 4:minimal plus]
 * 
 * TODO: this module does not take the type of servo elements into account.
 *       It might make sense to write functions that find these secific measurements.
 */
module clip_z()
{
	scl = Large_Servo_Scale/100.0;
	l_servo = servo_db[Large_Servo][1];
	s_servo = servo_db[Small_Servo][1];
	// ---- draw the top clipping box
	// draw a large cube that clips everything above the top of
	// the small servo mount
	if (s_servo!=undef && (Draw_Adapter==3 || Draw_Adapter==4)) {
		s_servo_top = -s_servo[5]+s_servo[4][1][2];
		echo(s_servo, s_servo_top);
		translate([0, 0, 100+s_servo_top])
			cube(200, center=true);
	}
	// draw a large cube that clips the lower half of the mount
	if (l_servo!=undef && (Draw_Adapter==1 || Draw_Adapter==3 || Draw_Adapter==4)) {
		// clip belom the large servo mount
		l_servo_bot = -l_servo[5]*scl - ((Draw_Adapter==4) ? 10 : 0);
		translate([0, 0, l_servo_bot-100])
			cube(200, center=true);
	} else if (s_servo!=undef && Draw_Adapter==2) {
		// clip belom the small servo case
		s_servo_bot = -s_servo[3][2];
		translate([0, 0, s_servo_bot-100])
			cube(200, center=true);
	}
}


/**
 * Draw the entire assembly
 */
module run() 
{	
	// TODO: create the actual servo dataset here by filling in undef values
	difference() {
		draw_scene();
		clip_y();
		clip_z();
	}
}


run();
